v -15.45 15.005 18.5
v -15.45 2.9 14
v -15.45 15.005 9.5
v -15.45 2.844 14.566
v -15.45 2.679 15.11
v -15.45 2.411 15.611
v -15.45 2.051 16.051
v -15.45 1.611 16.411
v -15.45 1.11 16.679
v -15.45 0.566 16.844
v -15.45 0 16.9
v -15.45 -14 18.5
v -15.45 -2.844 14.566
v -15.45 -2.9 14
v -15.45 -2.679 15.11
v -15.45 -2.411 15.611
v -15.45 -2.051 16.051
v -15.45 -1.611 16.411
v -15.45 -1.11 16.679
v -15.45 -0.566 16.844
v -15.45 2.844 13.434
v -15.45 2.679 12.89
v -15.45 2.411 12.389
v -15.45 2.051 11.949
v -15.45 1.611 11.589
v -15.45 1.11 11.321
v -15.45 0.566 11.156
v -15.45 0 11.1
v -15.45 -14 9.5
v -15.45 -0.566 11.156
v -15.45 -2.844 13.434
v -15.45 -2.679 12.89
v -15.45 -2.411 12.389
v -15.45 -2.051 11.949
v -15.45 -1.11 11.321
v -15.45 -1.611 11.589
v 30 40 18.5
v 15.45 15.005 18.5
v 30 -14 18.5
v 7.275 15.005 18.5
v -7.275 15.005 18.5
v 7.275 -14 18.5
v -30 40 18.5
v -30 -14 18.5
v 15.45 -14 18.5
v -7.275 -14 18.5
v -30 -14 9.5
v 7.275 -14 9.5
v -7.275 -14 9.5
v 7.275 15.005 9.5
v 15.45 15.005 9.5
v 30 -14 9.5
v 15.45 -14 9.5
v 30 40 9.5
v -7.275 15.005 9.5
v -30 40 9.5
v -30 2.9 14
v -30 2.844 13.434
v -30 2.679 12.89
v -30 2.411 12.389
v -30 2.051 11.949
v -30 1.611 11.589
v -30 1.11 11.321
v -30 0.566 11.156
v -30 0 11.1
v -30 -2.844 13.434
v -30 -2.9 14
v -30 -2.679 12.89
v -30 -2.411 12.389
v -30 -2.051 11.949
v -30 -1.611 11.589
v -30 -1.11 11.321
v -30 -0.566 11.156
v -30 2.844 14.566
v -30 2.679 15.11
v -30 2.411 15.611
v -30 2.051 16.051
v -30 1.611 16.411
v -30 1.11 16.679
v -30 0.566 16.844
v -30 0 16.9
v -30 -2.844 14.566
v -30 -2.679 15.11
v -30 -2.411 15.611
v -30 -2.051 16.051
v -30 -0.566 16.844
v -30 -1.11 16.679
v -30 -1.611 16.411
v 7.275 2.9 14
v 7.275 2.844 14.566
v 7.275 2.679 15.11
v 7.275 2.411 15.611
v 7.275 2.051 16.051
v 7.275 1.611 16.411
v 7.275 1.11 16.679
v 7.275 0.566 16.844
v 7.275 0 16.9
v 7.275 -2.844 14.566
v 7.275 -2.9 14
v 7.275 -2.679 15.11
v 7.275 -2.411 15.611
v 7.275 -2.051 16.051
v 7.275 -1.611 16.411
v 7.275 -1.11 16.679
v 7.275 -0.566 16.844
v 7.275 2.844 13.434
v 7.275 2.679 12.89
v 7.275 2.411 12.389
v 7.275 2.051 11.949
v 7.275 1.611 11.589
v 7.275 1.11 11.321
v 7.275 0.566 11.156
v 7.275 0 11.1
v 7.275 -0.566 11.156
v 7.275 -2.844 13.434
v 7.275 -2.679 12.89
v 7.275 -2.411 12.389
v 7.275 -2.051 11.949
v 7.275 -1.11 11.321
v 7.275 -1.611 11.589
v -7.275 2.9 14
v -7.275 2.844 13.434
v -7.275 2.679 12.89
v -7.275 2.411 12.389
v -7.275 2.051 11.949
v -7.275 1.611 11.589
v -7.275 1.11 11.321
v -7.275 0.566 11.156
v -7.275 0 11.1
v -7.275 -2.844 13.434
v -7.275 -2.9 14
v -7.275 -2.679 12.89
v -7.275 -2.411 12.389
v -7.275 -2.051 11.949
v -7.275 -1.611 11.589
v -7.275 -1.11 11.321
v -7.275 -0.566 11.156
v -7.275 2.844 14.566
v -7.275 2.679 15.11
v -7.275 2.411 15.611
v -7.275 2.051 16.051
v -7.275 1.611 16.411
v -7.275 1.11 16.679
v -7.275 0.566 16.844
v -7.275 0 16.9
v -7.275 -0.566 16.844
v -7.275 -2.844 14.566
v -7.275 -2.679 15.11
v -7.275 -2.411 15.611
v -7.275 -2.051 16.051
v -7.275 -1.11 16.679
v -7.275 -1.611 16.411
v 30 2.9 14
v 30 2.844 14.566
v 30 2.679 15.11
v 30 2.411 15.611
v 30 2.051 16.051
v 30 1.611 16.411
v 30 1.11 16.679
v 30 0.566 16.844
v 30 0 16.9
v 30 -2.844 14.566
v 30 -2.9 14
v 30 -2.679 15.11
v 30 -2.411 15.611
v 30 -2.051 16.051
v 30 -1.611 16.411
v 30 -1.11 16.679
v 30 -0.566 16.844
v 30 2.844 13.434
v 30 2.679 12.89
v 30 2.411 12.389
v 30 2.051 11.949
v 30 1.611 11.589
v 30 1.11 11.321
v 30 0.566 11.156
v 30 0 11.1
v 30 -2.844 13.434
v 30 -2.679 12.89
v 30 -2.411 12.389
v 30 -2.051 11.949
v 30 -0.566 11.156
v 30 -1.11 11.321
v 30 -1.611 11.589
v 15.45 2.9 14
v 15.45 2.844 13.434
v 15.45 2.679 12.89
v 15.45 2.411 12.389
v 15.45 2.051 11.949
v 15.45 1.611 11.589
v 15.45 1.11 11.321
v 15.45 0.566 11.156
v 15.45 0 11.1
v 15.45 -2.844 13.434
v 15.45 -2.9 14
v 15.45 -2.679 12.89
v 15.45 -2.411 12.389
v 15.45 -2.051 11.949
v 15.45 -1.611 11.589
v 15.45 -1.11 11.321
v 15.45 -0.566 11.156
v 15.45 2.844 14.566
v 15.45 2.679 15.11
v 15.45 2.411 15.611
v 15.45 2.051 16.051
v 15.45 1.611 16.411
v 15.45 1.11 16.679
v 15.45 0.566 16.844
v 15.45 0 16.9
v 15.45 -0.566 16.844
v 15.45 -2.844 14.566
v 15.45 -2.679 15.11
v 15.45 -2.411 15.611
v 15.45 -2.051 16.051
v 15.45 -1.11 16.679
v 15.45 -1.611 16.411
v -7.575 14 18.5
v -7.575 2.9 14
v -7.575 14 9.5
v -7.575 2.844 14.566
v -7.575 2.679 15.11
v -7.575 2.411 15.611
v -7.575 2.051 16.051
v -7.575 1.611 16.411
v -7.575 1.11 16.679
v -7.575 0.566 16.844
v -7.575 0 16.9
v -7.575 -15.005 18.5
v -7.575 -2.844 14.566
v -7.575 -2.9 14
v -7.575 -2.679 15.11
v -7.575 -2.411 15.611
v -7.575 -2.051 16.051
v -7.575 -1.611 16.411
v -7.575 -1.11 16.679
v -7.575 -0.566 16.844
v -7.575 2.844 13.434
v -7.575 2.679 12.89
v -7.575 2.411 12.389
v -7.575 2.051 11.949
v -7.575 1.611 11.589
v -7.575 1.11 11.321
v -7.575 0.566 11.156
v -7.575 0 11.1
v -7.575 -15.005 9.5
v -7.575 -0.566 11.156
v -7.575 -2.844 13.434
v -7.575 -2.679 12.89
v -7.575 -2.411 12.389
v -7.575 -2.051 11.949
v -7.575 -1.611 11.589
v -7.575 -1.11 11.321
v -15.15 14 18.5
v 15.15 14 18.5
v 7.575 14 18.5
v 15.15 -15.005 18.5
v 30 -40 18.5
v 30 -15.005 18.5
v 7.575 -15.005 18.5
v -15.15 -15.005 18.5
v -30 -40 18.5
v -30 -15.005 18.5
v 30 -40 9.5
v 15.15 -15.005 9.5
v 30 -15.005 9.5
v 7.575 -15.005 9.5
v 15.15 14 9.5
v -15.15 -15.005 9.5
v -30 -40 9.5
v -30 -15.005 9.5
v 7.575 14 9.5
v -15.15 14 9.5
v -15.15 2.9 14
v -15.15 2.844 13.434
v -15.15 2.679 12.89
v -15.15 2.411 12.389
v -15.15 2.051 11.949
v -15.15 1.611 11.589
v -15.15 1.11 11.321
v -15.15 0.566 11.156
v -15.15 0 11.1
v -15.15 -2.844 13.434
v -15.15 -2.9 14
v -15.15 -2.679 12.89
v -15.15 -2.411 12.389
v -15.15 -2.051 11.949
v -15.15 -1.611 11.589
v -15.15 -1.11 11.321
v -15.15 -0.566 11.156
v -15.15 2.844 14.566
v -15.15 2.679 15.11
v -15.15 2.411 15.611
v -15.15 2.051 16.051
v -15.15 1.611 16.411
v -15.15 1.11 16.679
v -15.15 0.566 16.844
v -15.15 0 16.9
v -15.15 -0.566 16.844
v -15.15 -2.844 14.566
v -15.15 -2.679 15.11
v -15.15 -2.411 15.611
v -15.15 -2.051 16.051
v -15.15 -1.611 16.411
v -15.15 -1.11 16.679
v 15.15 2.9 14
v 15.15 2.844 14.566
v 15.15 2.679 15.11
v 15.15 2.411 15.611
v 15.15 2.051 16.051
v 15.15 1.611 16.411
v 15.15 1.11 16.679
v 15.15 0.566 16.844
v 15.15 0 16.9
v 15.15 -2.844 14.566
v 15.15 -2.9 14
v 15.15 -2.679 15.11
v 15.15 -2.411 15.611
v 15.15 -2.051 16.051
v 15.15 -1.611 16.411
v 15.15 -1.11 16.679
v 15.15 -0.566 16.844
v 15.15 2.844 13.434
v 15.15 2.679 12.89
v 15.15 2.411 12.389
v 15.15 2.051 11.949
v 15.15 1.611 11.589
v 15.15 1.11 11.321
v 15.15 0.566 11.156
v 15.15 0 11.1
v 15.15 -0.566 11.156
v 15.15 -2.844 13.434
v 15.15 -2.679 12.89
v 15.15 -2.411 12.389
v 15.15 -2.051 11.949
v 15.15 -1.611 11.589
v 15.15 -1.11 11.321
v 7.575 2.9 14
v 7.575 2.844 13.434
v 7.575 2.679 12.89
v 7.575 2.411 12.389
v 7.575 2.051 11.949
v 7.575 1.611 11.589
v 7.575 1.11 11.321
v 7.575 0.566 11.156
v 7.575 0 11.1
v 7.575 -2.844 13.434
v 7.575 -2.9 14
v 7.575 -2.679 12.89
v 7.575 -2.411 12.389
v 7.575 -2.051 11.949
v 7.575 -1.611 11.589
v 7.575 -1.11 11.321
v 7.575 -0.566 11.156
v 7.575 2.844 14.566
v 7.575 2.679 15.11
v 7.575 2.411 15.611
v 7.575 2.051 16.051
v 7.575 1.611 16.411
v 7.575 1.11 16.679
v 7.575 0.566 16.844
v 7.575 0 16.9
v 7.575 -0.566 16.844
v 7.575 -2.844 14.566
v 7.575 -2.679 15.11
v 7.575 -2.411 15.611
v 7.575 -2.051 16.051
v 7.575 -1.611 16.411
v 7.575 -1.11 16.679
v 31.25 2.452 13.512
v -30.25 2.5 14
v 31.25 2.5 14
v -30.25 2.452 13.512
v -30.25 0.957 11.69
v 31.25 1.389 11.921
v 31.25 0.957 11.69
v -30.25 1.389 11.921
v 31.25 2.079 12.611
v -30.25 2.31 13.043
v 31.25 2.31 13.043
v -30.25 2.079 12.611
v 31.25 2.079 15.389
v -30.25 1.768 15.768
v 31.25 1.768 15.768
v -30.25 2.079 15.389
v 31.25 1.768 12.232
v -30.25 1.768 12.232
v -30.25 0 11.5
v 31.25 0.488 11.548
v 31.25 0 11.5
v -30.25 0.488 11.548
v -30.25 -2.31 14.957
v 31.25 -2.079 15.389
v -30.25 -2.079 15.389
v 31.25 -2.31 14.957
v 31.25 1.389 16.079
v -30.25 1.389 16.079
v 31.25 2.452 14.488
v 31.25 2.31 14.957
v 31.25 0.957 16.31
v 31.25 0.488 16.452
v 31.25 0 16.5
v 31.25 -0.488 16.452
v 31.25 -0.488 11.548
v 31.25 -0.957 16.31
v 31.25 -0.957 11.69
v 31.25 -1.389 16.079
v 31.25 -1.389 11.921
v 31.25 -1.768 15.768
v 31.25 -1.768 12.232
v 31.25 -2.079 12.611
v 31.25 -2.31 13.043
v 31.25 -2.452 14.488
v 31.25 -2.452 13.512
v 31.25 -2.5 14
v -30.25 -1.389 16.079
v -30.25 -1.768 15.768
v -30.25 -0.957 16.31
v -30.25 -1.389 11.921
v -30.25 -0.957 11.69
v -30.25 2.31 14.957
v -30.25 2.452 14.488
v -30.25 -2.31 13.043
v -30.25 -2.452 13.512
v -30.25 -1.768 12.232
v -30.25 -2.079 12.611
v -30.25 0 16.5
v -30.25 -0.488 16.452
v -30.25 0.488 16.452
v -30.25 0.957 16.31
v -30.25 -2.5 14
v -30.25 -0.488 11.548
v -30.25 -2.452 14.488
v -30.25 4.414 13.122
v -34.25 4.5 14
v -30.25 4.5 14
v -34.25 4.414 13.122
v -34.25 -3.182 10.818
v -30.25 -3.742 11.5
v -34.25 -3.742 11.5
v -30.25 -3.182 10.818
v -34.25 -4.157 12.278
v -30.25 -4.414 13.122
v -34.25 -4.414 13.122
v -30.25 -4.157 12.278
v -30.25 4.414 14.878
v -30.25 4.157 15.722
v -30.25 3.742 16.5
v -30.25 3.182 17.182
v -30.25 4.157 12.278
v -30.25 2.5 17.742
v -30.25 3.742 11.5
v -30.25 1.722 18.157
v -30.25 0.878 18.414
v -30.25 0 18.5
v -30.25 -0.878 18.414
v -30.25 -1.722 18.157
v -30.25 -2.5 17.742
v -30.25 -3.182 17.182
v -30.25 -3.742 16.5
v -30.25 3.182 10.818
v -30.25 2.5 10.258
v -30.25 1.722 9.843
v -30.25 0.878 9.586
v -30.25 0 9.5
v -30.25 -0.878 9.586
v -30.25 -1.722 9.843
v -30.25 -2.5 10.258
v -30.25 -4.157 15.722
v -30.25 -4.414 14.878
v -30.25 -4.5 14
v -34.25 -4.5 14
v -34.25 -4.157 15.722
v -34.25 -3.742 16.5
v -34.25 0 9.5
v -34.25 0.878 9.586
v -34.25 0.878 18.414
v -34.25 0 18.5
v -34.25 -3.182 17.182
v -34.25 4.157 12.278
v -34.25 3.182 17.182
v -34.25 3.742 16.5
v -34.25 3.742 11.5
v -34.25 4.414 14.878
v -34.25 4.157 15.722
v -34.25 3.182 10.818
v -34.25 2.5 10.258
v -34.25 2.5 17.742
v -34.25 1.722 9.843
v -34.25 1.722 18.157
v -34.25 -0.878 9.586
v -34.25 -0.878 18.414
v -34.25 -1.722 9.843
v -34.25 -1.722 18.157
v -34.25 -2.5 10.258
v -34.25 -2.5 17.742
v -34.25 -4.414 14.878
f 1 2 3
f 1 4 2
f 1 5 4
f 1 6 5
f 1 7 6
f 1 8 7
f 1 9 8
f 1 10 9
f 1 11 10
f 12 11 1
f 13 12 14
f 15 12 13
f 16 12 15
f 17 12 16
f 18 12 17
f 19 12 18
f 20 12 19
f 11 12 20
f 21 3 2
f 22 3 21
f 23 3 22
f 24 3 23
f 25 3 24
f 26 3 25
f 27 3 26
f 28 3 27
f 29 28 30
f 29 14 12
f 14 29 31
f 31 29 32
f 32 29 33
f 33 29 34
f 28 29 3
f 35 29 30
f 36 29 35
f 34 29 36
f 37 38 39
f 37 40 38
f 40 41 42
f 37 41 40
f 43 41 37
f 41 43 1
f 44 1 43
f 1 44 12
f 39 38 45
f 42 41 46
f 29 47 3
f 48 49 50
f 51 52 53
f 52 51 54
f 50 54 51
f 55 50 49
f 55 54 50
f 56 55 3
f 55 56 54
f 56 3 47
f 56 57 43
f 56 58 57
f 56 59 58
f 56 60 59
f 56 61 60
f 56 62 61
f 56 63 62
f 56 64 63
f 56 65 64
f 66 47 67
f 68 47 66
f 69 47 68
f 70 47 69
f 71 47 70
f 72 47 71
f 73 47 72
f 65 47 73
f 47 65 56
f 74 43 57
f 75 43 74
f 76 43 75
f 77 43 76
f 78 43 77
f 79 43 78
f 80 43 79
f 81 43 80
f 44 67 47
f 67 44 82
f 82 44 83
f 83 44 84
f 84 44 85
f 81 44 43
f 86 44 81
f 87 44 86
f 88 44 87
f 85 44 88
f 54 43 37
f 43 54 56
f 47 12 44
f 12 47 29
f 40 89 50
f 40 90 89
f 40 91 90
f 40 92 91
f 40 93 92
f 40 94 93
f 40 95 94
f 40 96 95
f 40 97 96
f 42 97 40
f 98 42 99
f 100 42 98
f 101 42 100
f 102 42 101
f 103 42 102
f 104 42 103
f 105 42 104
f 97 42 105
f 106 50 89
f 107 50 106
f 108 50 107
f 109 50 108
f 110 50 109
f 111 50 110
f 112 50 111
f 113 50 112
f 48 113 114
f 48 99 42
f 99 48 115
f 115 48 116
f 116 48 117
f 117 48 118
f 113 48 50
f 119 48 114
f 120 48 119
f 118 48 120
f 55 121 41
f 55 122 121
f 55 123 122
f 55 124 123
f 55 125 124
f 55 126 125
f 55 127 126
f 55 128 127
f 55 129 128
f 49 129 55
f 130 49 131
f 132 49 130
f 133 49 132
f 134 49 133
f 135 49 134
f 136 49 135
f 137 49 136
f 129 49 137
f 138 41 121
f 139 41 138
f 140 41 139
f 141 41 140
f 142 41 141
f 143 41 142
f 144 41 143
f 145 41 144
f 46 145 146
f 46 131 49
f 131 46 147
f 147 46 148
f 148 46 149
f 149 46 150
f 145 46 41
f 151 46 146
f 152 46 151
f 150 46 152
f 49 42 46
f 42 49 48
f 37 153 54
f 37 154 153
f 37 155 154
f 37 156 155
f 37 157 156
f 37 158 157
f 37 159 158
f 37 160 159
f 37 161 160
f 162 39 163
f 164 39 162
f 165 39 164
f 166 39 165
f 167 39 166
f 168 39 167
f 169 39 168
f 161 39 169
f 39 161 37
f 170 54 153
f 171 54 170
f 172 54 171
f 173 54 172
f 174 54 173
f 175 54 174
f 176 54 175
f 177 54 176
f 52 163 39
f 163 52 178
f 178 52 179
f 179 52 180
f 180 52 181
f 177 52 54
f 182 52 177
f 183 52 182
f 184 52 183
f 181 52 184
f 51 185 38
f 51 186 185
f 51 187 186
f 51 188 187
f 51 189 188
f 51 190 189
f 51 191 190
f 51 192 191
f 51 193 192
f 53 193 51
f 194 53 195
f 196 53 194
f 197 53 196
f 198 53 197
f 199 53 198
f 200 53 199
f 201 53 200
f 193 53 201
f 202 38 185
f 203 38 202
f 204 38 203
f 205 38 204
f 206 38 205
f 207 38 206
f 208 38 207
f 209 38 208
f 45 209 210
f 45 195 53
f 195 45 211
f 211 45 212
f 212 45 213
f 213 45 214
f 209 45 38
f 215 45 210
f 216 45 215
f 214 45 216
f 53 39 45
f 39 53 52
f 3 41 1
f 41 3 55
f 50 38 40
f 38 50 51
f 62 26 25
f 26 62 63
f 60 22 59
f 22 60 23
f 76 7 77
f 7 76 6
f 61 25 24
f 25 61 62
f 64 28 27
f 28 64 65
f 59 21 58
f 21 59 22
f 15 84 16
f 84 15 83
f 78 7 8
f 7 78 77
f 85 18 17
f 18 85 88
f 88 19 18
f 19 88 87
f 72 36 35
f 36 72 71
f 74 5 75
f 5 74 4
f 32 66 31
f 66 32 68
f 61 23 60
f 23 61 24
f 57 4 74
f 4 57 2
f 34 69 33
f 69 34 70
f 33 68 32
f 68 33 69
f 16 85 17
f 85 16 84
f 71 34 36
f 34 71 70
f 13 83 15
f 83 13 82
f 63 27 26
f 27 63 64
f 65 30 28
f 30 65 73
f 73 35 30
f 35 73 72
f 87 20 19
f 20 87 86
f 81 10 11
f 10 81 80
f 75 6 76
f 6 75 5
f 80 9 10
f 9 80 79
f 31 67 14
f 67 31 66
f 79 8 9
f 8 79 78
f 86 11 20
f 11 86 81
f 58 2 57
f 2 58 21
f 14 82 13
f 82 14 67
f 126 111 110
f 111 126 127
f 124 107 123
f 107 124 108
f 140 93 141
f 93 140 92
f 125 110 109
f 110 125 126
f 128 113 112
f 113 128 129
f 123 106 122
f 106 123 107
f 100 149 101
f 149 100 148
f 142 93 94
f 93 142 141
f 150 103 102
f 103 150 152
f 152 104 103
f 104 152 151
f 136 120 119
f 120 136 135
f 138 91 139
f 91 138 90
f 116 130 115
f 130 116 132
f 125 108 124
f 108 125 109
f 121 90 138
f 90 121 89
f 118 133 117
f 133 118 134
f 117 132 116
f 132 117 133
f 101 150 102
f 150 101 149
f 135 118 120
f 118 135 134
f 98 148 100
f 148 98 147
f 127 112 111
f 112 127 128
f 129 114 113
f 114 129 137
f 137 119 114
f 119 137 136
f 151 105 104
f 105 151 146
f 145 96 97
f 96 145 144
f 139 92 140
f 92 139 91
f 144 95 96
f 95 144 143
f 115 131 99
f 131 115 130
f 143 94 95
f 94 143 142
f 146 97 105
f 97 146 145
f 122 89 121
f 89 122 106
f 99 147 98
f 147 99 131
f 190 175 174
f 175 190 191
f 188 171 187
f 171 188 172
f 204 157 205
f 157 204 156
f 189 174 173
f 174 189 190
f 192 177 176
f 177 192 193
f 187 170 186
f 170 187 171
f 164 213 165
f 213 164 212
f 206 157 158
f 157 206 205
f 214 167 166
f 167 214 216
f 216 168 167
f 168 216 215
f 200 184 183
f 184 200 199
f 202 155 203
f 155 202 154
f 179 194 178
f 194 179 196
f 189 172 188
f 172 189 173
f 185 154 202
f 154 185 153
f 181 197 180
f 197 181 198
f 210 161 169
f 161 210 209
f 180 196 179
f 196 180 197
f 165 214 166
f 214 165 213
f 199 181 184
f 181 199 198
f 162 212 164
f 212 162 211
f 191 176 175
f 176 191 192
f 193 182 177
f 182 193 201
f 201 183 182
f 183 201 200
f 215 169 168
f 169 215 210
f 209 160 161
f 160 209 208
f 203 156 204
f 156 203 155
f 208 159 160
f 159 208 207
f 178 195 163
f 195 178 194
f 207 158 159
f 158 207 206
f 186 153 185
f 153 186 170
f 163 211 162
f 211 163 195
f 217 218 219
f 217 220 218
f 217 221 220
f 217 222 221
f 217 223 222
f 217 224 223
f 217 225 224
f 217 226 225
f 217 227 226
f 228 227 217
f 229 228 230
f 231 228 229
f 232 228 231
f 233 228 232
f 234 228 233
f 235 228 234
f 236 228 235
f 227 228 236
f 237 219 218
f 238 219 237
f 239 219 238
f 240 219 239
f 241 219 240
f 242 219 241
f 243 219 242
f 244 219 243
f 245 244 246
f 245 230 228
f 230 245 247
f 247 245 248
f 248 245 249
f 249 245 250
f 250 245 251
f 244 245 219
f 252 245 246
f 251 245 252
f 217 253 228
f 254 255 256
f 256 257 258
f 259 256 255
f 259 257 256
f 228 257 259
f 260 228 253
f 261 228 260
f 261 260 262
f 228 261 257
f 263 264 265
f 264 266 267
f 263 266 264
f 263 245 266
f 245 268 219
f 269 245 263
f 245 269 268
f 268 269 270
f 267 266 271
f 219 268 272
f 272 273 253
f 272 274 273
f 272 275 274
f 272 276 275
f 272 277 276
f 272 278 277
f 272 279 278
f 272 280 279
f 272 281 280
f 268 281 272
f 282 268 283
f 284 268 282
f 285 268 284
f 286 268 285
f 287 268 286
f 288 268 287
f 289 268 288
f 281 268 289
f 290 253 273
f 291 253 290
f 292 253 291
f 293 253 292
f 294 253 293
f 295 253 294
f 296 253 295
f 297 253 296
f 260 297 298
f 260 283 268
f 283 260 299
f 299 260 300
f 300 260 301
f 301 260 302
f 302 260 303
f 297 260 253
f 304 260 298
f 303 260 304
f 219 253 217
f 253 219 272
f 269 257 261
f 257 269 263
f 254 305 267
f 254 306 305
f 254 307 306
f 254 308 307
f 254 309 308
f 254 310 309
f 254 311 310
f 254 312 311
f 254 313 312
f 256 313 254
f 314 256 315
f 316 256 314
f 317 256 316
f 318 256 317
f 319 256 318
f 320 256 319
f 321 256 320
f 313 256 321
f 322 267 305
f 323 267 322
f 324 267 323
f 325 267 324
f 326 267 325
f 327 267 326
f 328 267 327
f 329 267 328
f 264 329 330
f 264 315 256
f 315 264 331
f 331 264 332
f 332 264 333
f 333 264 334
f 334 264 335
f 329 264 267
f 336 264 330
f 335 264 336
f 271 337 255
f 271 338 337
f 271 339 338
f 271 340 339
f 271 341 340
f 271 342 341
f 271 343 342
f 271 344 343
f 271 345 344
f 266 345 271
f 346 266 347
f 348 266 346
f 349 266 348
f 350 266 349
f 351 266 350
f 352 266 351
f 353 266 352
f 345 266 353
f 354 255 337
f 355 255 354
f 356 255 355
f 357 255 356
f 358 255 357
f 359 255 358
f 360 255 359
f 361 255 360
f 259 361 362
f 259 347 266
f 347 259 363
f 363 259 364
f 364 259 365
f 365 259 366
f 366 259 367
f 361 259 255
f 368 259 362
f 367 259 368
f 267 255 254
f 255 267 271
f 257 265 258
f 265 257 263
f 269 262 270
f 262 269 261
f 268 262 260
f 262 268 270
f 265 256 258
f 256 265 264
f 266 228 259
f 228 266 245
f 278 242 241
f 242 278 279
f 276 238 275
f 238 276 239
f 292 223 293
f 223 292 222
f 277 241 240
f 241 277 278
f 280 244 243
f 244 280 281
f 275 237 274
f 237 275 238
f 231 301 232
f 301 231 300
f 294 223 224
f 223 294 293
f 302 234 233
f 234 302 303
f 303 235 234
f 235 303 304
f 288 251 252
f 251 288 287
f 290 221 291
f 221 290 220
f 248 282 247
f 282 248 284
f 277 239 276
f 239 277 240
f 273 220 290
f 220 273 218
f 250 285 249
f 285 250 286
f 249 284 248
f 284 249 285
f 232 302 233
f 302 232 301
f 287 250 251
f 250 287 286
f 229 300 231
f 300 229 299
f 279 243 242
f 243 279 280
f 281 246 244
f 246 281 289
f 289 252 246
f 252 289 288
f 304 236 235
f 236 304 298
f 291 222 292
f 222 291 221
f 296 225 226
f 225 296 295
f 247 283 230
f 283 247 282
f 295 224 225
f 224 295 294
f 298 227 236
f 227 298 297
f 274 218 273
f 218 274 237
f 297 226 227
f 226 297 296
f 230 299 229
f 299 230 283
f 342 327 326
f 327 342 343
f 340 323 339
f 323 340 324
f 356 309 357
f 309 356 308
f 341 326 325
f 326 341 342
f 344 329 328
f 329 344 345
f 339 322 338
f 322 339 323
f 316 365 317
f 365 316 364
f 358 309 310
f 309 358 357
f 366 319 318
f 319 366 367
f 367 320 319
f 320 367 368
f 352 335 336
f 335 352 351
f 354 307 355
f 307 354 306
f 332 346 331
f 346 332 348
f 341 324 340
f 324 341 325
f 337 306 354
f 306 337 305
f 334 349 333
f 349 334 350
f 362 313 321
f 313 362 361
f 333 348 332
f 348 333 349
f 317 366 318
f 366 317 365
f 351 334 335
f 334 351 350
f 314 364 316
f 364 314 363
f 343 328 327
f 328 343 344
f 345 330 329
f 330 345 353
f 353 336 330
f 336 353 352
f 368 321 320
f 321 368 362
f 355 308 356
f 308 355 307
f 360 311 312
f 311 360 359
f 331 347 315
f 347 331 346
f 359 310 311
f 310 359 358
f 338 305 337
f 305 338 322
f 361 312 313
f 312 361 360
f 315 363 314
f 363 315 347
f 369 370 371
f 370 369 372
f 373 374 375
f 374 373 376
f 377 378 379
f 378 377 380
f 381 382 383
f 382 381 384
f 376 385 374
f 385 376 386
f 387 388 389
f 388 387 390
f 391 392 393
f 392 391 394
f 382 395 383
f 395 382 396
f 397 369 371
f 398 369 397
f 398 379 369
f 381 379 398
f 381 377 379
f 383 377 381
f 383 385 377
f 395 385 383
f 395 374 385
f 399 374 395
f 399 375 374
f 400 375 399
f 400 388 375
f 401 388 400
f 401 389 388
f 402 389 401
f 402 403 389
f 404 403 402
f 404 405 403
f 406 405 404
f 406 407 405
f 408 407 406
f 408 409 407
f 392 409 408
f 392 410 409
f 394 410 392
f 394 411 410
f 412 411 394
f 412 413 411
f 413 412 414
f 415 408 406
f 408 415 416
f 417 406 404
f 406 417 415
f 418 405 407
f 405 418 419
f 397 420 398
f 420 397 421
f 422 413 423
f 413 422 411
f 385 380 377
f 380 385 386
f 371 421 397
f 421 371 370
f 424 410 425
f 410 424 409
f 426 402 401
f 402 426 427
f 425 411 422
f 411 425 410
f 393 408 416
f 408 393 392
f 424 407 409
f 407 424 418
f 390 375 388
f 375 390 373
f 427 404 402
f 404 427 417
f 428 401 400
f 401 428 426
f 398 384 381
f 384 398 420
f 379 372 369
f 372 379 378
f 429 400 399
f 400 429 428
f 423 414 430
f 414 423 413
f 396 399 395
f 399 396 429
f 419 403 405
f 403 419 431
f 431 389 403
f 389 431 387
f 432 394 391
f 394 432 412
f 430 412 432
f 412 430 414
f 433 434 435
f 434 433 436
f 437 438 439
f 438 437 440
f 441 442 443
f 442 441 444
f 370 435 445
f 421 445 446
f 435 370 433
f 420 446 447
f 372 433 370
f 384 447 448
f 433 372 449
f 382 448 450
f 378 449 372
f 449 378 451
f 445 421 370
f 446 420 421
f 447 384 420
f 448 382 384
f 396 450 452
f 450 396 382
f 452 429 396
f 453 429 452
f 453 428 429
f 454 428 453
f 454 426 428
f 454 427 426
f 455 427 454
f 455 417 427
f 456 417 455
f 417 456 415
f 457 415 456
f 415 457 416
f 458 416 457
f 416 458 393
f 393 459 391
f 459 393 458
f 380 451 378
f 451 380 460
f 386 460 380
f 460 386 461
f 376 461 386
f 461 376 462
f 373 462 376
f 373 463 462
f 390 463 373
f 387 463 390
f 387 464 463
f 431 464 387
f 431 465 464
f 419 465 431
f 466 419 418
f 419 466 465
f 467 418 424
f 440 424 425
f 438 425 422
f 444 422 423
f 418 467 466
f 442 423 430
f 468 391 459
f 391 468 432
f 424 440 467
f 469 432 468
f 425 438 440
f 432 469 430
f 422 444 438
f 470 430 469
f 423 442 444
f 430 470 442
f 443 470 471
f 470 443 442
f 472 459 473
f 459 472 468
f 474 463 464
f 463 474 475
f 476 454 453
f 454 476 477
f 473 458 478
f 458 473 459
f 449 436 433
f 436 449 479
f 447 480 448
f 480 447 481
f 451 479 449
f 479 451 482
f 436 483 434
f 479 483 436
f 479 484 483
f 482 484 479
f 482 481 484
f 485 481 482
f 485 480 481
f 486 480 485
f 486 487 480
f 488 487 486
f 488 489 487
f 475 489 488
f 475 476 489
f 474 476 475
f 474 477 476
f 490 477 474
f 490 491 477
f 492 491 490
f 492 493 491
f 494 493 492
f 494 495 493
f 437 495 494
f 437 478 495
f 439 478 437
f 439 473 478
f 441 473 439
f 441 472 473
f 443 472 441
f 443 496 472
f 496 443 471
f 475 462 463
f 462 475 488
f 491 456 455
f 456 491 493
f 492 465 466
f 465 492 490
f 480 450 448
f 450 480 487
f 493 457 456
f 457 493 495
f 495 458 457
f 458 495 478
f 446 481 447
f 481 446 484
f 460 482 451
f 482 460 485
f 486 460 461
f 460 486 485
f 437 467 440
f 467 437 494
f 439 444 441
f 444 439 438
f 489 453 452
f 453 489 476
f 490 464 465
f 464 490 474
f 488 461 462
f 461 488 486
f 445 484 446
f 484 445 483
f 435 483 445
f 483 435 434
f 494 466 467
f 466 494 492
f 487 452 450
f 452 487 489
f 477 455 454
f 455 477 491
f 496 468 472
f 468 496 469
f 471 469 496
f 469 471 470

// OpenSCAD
$fn = 32;

// ------------------------------------------------------------------------
// Butt hinge: hinge 60 mm, leaf swung 0 deg
// Every part is its own module, assembly() places every instance.
// ------------------------------------------------------------------------

// --- part 1 ---
module hinge_base() {
  difference() {
    union() {
      translate([-30, -14, -4.5]) cube([14.55, 54, 9]);
      translate([-7.275, -14, -4.5]) cube([14.55, 54, 9]);
      translate([15.45, -14, -4.5]) cube([14.55, 54, 9]);
      translate([-30, 15.005, -4.5]) cube([60, 24.995, 9]);
    }
    translate([-22.725, 0, 0]) rotate([0, 90, 0]) cylinder(h = 16.55, d = 5.8, center = true);
    translate([0, 0, 0]) rotate([0, 90, 0]) cylinder(h = 16.55, d = 5.8, center = true);
    translate([22.725, 0, 0]) rotate([0, 90, 0]) cylinder(h = 16.55, d = 5.8, center = true);
  }
}

// --- part 2 ---
module hinge_mover() {
  difference() {
    union() {
      translate([-15.15, -40, -4.5]) cube([7.575, 54, 9]);
      translate([7.575, -40, -4.5]) cube([7.575, 54, 9]);
      translate([-30, -40, -4.5]) cube([60, 24.995, 9]);
    }
    translate([-11.362, 0, 0]) rotate([0, 90, 0]) cylinder(h = 9.575, d = 5.8, center = true);
    translate([11.362, 0, 0]) rotate([0, 90, 0]) cylinder(h = 9.575, d = 5.8, center = true);
  }
}

// --- part 3 ---
module hinge_pin() {
  rotate([0, 90, 0]) cylinder(h = 62.5, d = 5, center = true);
  translate([-34.25, 0, 0]) rotate([0, 90, 0]) cylinder(h = 4, d = 9);
}

// --- assembly ---
module assembly() {
  color([0.80, 0.24, 0.20]) translate([0, 0, 14]) rotate([0, 0, 0]) hinge_base();
  color([0.20, 0.45, 0.75]) translate([0, 0, 14]) rotate([0, 0, 0]) hinge_mover();
  color([0.25, 0.62, 0.32]) translate([0, 0, 14]) rotate([0, 0, 0]) hinge_pin();
}

assembly();
